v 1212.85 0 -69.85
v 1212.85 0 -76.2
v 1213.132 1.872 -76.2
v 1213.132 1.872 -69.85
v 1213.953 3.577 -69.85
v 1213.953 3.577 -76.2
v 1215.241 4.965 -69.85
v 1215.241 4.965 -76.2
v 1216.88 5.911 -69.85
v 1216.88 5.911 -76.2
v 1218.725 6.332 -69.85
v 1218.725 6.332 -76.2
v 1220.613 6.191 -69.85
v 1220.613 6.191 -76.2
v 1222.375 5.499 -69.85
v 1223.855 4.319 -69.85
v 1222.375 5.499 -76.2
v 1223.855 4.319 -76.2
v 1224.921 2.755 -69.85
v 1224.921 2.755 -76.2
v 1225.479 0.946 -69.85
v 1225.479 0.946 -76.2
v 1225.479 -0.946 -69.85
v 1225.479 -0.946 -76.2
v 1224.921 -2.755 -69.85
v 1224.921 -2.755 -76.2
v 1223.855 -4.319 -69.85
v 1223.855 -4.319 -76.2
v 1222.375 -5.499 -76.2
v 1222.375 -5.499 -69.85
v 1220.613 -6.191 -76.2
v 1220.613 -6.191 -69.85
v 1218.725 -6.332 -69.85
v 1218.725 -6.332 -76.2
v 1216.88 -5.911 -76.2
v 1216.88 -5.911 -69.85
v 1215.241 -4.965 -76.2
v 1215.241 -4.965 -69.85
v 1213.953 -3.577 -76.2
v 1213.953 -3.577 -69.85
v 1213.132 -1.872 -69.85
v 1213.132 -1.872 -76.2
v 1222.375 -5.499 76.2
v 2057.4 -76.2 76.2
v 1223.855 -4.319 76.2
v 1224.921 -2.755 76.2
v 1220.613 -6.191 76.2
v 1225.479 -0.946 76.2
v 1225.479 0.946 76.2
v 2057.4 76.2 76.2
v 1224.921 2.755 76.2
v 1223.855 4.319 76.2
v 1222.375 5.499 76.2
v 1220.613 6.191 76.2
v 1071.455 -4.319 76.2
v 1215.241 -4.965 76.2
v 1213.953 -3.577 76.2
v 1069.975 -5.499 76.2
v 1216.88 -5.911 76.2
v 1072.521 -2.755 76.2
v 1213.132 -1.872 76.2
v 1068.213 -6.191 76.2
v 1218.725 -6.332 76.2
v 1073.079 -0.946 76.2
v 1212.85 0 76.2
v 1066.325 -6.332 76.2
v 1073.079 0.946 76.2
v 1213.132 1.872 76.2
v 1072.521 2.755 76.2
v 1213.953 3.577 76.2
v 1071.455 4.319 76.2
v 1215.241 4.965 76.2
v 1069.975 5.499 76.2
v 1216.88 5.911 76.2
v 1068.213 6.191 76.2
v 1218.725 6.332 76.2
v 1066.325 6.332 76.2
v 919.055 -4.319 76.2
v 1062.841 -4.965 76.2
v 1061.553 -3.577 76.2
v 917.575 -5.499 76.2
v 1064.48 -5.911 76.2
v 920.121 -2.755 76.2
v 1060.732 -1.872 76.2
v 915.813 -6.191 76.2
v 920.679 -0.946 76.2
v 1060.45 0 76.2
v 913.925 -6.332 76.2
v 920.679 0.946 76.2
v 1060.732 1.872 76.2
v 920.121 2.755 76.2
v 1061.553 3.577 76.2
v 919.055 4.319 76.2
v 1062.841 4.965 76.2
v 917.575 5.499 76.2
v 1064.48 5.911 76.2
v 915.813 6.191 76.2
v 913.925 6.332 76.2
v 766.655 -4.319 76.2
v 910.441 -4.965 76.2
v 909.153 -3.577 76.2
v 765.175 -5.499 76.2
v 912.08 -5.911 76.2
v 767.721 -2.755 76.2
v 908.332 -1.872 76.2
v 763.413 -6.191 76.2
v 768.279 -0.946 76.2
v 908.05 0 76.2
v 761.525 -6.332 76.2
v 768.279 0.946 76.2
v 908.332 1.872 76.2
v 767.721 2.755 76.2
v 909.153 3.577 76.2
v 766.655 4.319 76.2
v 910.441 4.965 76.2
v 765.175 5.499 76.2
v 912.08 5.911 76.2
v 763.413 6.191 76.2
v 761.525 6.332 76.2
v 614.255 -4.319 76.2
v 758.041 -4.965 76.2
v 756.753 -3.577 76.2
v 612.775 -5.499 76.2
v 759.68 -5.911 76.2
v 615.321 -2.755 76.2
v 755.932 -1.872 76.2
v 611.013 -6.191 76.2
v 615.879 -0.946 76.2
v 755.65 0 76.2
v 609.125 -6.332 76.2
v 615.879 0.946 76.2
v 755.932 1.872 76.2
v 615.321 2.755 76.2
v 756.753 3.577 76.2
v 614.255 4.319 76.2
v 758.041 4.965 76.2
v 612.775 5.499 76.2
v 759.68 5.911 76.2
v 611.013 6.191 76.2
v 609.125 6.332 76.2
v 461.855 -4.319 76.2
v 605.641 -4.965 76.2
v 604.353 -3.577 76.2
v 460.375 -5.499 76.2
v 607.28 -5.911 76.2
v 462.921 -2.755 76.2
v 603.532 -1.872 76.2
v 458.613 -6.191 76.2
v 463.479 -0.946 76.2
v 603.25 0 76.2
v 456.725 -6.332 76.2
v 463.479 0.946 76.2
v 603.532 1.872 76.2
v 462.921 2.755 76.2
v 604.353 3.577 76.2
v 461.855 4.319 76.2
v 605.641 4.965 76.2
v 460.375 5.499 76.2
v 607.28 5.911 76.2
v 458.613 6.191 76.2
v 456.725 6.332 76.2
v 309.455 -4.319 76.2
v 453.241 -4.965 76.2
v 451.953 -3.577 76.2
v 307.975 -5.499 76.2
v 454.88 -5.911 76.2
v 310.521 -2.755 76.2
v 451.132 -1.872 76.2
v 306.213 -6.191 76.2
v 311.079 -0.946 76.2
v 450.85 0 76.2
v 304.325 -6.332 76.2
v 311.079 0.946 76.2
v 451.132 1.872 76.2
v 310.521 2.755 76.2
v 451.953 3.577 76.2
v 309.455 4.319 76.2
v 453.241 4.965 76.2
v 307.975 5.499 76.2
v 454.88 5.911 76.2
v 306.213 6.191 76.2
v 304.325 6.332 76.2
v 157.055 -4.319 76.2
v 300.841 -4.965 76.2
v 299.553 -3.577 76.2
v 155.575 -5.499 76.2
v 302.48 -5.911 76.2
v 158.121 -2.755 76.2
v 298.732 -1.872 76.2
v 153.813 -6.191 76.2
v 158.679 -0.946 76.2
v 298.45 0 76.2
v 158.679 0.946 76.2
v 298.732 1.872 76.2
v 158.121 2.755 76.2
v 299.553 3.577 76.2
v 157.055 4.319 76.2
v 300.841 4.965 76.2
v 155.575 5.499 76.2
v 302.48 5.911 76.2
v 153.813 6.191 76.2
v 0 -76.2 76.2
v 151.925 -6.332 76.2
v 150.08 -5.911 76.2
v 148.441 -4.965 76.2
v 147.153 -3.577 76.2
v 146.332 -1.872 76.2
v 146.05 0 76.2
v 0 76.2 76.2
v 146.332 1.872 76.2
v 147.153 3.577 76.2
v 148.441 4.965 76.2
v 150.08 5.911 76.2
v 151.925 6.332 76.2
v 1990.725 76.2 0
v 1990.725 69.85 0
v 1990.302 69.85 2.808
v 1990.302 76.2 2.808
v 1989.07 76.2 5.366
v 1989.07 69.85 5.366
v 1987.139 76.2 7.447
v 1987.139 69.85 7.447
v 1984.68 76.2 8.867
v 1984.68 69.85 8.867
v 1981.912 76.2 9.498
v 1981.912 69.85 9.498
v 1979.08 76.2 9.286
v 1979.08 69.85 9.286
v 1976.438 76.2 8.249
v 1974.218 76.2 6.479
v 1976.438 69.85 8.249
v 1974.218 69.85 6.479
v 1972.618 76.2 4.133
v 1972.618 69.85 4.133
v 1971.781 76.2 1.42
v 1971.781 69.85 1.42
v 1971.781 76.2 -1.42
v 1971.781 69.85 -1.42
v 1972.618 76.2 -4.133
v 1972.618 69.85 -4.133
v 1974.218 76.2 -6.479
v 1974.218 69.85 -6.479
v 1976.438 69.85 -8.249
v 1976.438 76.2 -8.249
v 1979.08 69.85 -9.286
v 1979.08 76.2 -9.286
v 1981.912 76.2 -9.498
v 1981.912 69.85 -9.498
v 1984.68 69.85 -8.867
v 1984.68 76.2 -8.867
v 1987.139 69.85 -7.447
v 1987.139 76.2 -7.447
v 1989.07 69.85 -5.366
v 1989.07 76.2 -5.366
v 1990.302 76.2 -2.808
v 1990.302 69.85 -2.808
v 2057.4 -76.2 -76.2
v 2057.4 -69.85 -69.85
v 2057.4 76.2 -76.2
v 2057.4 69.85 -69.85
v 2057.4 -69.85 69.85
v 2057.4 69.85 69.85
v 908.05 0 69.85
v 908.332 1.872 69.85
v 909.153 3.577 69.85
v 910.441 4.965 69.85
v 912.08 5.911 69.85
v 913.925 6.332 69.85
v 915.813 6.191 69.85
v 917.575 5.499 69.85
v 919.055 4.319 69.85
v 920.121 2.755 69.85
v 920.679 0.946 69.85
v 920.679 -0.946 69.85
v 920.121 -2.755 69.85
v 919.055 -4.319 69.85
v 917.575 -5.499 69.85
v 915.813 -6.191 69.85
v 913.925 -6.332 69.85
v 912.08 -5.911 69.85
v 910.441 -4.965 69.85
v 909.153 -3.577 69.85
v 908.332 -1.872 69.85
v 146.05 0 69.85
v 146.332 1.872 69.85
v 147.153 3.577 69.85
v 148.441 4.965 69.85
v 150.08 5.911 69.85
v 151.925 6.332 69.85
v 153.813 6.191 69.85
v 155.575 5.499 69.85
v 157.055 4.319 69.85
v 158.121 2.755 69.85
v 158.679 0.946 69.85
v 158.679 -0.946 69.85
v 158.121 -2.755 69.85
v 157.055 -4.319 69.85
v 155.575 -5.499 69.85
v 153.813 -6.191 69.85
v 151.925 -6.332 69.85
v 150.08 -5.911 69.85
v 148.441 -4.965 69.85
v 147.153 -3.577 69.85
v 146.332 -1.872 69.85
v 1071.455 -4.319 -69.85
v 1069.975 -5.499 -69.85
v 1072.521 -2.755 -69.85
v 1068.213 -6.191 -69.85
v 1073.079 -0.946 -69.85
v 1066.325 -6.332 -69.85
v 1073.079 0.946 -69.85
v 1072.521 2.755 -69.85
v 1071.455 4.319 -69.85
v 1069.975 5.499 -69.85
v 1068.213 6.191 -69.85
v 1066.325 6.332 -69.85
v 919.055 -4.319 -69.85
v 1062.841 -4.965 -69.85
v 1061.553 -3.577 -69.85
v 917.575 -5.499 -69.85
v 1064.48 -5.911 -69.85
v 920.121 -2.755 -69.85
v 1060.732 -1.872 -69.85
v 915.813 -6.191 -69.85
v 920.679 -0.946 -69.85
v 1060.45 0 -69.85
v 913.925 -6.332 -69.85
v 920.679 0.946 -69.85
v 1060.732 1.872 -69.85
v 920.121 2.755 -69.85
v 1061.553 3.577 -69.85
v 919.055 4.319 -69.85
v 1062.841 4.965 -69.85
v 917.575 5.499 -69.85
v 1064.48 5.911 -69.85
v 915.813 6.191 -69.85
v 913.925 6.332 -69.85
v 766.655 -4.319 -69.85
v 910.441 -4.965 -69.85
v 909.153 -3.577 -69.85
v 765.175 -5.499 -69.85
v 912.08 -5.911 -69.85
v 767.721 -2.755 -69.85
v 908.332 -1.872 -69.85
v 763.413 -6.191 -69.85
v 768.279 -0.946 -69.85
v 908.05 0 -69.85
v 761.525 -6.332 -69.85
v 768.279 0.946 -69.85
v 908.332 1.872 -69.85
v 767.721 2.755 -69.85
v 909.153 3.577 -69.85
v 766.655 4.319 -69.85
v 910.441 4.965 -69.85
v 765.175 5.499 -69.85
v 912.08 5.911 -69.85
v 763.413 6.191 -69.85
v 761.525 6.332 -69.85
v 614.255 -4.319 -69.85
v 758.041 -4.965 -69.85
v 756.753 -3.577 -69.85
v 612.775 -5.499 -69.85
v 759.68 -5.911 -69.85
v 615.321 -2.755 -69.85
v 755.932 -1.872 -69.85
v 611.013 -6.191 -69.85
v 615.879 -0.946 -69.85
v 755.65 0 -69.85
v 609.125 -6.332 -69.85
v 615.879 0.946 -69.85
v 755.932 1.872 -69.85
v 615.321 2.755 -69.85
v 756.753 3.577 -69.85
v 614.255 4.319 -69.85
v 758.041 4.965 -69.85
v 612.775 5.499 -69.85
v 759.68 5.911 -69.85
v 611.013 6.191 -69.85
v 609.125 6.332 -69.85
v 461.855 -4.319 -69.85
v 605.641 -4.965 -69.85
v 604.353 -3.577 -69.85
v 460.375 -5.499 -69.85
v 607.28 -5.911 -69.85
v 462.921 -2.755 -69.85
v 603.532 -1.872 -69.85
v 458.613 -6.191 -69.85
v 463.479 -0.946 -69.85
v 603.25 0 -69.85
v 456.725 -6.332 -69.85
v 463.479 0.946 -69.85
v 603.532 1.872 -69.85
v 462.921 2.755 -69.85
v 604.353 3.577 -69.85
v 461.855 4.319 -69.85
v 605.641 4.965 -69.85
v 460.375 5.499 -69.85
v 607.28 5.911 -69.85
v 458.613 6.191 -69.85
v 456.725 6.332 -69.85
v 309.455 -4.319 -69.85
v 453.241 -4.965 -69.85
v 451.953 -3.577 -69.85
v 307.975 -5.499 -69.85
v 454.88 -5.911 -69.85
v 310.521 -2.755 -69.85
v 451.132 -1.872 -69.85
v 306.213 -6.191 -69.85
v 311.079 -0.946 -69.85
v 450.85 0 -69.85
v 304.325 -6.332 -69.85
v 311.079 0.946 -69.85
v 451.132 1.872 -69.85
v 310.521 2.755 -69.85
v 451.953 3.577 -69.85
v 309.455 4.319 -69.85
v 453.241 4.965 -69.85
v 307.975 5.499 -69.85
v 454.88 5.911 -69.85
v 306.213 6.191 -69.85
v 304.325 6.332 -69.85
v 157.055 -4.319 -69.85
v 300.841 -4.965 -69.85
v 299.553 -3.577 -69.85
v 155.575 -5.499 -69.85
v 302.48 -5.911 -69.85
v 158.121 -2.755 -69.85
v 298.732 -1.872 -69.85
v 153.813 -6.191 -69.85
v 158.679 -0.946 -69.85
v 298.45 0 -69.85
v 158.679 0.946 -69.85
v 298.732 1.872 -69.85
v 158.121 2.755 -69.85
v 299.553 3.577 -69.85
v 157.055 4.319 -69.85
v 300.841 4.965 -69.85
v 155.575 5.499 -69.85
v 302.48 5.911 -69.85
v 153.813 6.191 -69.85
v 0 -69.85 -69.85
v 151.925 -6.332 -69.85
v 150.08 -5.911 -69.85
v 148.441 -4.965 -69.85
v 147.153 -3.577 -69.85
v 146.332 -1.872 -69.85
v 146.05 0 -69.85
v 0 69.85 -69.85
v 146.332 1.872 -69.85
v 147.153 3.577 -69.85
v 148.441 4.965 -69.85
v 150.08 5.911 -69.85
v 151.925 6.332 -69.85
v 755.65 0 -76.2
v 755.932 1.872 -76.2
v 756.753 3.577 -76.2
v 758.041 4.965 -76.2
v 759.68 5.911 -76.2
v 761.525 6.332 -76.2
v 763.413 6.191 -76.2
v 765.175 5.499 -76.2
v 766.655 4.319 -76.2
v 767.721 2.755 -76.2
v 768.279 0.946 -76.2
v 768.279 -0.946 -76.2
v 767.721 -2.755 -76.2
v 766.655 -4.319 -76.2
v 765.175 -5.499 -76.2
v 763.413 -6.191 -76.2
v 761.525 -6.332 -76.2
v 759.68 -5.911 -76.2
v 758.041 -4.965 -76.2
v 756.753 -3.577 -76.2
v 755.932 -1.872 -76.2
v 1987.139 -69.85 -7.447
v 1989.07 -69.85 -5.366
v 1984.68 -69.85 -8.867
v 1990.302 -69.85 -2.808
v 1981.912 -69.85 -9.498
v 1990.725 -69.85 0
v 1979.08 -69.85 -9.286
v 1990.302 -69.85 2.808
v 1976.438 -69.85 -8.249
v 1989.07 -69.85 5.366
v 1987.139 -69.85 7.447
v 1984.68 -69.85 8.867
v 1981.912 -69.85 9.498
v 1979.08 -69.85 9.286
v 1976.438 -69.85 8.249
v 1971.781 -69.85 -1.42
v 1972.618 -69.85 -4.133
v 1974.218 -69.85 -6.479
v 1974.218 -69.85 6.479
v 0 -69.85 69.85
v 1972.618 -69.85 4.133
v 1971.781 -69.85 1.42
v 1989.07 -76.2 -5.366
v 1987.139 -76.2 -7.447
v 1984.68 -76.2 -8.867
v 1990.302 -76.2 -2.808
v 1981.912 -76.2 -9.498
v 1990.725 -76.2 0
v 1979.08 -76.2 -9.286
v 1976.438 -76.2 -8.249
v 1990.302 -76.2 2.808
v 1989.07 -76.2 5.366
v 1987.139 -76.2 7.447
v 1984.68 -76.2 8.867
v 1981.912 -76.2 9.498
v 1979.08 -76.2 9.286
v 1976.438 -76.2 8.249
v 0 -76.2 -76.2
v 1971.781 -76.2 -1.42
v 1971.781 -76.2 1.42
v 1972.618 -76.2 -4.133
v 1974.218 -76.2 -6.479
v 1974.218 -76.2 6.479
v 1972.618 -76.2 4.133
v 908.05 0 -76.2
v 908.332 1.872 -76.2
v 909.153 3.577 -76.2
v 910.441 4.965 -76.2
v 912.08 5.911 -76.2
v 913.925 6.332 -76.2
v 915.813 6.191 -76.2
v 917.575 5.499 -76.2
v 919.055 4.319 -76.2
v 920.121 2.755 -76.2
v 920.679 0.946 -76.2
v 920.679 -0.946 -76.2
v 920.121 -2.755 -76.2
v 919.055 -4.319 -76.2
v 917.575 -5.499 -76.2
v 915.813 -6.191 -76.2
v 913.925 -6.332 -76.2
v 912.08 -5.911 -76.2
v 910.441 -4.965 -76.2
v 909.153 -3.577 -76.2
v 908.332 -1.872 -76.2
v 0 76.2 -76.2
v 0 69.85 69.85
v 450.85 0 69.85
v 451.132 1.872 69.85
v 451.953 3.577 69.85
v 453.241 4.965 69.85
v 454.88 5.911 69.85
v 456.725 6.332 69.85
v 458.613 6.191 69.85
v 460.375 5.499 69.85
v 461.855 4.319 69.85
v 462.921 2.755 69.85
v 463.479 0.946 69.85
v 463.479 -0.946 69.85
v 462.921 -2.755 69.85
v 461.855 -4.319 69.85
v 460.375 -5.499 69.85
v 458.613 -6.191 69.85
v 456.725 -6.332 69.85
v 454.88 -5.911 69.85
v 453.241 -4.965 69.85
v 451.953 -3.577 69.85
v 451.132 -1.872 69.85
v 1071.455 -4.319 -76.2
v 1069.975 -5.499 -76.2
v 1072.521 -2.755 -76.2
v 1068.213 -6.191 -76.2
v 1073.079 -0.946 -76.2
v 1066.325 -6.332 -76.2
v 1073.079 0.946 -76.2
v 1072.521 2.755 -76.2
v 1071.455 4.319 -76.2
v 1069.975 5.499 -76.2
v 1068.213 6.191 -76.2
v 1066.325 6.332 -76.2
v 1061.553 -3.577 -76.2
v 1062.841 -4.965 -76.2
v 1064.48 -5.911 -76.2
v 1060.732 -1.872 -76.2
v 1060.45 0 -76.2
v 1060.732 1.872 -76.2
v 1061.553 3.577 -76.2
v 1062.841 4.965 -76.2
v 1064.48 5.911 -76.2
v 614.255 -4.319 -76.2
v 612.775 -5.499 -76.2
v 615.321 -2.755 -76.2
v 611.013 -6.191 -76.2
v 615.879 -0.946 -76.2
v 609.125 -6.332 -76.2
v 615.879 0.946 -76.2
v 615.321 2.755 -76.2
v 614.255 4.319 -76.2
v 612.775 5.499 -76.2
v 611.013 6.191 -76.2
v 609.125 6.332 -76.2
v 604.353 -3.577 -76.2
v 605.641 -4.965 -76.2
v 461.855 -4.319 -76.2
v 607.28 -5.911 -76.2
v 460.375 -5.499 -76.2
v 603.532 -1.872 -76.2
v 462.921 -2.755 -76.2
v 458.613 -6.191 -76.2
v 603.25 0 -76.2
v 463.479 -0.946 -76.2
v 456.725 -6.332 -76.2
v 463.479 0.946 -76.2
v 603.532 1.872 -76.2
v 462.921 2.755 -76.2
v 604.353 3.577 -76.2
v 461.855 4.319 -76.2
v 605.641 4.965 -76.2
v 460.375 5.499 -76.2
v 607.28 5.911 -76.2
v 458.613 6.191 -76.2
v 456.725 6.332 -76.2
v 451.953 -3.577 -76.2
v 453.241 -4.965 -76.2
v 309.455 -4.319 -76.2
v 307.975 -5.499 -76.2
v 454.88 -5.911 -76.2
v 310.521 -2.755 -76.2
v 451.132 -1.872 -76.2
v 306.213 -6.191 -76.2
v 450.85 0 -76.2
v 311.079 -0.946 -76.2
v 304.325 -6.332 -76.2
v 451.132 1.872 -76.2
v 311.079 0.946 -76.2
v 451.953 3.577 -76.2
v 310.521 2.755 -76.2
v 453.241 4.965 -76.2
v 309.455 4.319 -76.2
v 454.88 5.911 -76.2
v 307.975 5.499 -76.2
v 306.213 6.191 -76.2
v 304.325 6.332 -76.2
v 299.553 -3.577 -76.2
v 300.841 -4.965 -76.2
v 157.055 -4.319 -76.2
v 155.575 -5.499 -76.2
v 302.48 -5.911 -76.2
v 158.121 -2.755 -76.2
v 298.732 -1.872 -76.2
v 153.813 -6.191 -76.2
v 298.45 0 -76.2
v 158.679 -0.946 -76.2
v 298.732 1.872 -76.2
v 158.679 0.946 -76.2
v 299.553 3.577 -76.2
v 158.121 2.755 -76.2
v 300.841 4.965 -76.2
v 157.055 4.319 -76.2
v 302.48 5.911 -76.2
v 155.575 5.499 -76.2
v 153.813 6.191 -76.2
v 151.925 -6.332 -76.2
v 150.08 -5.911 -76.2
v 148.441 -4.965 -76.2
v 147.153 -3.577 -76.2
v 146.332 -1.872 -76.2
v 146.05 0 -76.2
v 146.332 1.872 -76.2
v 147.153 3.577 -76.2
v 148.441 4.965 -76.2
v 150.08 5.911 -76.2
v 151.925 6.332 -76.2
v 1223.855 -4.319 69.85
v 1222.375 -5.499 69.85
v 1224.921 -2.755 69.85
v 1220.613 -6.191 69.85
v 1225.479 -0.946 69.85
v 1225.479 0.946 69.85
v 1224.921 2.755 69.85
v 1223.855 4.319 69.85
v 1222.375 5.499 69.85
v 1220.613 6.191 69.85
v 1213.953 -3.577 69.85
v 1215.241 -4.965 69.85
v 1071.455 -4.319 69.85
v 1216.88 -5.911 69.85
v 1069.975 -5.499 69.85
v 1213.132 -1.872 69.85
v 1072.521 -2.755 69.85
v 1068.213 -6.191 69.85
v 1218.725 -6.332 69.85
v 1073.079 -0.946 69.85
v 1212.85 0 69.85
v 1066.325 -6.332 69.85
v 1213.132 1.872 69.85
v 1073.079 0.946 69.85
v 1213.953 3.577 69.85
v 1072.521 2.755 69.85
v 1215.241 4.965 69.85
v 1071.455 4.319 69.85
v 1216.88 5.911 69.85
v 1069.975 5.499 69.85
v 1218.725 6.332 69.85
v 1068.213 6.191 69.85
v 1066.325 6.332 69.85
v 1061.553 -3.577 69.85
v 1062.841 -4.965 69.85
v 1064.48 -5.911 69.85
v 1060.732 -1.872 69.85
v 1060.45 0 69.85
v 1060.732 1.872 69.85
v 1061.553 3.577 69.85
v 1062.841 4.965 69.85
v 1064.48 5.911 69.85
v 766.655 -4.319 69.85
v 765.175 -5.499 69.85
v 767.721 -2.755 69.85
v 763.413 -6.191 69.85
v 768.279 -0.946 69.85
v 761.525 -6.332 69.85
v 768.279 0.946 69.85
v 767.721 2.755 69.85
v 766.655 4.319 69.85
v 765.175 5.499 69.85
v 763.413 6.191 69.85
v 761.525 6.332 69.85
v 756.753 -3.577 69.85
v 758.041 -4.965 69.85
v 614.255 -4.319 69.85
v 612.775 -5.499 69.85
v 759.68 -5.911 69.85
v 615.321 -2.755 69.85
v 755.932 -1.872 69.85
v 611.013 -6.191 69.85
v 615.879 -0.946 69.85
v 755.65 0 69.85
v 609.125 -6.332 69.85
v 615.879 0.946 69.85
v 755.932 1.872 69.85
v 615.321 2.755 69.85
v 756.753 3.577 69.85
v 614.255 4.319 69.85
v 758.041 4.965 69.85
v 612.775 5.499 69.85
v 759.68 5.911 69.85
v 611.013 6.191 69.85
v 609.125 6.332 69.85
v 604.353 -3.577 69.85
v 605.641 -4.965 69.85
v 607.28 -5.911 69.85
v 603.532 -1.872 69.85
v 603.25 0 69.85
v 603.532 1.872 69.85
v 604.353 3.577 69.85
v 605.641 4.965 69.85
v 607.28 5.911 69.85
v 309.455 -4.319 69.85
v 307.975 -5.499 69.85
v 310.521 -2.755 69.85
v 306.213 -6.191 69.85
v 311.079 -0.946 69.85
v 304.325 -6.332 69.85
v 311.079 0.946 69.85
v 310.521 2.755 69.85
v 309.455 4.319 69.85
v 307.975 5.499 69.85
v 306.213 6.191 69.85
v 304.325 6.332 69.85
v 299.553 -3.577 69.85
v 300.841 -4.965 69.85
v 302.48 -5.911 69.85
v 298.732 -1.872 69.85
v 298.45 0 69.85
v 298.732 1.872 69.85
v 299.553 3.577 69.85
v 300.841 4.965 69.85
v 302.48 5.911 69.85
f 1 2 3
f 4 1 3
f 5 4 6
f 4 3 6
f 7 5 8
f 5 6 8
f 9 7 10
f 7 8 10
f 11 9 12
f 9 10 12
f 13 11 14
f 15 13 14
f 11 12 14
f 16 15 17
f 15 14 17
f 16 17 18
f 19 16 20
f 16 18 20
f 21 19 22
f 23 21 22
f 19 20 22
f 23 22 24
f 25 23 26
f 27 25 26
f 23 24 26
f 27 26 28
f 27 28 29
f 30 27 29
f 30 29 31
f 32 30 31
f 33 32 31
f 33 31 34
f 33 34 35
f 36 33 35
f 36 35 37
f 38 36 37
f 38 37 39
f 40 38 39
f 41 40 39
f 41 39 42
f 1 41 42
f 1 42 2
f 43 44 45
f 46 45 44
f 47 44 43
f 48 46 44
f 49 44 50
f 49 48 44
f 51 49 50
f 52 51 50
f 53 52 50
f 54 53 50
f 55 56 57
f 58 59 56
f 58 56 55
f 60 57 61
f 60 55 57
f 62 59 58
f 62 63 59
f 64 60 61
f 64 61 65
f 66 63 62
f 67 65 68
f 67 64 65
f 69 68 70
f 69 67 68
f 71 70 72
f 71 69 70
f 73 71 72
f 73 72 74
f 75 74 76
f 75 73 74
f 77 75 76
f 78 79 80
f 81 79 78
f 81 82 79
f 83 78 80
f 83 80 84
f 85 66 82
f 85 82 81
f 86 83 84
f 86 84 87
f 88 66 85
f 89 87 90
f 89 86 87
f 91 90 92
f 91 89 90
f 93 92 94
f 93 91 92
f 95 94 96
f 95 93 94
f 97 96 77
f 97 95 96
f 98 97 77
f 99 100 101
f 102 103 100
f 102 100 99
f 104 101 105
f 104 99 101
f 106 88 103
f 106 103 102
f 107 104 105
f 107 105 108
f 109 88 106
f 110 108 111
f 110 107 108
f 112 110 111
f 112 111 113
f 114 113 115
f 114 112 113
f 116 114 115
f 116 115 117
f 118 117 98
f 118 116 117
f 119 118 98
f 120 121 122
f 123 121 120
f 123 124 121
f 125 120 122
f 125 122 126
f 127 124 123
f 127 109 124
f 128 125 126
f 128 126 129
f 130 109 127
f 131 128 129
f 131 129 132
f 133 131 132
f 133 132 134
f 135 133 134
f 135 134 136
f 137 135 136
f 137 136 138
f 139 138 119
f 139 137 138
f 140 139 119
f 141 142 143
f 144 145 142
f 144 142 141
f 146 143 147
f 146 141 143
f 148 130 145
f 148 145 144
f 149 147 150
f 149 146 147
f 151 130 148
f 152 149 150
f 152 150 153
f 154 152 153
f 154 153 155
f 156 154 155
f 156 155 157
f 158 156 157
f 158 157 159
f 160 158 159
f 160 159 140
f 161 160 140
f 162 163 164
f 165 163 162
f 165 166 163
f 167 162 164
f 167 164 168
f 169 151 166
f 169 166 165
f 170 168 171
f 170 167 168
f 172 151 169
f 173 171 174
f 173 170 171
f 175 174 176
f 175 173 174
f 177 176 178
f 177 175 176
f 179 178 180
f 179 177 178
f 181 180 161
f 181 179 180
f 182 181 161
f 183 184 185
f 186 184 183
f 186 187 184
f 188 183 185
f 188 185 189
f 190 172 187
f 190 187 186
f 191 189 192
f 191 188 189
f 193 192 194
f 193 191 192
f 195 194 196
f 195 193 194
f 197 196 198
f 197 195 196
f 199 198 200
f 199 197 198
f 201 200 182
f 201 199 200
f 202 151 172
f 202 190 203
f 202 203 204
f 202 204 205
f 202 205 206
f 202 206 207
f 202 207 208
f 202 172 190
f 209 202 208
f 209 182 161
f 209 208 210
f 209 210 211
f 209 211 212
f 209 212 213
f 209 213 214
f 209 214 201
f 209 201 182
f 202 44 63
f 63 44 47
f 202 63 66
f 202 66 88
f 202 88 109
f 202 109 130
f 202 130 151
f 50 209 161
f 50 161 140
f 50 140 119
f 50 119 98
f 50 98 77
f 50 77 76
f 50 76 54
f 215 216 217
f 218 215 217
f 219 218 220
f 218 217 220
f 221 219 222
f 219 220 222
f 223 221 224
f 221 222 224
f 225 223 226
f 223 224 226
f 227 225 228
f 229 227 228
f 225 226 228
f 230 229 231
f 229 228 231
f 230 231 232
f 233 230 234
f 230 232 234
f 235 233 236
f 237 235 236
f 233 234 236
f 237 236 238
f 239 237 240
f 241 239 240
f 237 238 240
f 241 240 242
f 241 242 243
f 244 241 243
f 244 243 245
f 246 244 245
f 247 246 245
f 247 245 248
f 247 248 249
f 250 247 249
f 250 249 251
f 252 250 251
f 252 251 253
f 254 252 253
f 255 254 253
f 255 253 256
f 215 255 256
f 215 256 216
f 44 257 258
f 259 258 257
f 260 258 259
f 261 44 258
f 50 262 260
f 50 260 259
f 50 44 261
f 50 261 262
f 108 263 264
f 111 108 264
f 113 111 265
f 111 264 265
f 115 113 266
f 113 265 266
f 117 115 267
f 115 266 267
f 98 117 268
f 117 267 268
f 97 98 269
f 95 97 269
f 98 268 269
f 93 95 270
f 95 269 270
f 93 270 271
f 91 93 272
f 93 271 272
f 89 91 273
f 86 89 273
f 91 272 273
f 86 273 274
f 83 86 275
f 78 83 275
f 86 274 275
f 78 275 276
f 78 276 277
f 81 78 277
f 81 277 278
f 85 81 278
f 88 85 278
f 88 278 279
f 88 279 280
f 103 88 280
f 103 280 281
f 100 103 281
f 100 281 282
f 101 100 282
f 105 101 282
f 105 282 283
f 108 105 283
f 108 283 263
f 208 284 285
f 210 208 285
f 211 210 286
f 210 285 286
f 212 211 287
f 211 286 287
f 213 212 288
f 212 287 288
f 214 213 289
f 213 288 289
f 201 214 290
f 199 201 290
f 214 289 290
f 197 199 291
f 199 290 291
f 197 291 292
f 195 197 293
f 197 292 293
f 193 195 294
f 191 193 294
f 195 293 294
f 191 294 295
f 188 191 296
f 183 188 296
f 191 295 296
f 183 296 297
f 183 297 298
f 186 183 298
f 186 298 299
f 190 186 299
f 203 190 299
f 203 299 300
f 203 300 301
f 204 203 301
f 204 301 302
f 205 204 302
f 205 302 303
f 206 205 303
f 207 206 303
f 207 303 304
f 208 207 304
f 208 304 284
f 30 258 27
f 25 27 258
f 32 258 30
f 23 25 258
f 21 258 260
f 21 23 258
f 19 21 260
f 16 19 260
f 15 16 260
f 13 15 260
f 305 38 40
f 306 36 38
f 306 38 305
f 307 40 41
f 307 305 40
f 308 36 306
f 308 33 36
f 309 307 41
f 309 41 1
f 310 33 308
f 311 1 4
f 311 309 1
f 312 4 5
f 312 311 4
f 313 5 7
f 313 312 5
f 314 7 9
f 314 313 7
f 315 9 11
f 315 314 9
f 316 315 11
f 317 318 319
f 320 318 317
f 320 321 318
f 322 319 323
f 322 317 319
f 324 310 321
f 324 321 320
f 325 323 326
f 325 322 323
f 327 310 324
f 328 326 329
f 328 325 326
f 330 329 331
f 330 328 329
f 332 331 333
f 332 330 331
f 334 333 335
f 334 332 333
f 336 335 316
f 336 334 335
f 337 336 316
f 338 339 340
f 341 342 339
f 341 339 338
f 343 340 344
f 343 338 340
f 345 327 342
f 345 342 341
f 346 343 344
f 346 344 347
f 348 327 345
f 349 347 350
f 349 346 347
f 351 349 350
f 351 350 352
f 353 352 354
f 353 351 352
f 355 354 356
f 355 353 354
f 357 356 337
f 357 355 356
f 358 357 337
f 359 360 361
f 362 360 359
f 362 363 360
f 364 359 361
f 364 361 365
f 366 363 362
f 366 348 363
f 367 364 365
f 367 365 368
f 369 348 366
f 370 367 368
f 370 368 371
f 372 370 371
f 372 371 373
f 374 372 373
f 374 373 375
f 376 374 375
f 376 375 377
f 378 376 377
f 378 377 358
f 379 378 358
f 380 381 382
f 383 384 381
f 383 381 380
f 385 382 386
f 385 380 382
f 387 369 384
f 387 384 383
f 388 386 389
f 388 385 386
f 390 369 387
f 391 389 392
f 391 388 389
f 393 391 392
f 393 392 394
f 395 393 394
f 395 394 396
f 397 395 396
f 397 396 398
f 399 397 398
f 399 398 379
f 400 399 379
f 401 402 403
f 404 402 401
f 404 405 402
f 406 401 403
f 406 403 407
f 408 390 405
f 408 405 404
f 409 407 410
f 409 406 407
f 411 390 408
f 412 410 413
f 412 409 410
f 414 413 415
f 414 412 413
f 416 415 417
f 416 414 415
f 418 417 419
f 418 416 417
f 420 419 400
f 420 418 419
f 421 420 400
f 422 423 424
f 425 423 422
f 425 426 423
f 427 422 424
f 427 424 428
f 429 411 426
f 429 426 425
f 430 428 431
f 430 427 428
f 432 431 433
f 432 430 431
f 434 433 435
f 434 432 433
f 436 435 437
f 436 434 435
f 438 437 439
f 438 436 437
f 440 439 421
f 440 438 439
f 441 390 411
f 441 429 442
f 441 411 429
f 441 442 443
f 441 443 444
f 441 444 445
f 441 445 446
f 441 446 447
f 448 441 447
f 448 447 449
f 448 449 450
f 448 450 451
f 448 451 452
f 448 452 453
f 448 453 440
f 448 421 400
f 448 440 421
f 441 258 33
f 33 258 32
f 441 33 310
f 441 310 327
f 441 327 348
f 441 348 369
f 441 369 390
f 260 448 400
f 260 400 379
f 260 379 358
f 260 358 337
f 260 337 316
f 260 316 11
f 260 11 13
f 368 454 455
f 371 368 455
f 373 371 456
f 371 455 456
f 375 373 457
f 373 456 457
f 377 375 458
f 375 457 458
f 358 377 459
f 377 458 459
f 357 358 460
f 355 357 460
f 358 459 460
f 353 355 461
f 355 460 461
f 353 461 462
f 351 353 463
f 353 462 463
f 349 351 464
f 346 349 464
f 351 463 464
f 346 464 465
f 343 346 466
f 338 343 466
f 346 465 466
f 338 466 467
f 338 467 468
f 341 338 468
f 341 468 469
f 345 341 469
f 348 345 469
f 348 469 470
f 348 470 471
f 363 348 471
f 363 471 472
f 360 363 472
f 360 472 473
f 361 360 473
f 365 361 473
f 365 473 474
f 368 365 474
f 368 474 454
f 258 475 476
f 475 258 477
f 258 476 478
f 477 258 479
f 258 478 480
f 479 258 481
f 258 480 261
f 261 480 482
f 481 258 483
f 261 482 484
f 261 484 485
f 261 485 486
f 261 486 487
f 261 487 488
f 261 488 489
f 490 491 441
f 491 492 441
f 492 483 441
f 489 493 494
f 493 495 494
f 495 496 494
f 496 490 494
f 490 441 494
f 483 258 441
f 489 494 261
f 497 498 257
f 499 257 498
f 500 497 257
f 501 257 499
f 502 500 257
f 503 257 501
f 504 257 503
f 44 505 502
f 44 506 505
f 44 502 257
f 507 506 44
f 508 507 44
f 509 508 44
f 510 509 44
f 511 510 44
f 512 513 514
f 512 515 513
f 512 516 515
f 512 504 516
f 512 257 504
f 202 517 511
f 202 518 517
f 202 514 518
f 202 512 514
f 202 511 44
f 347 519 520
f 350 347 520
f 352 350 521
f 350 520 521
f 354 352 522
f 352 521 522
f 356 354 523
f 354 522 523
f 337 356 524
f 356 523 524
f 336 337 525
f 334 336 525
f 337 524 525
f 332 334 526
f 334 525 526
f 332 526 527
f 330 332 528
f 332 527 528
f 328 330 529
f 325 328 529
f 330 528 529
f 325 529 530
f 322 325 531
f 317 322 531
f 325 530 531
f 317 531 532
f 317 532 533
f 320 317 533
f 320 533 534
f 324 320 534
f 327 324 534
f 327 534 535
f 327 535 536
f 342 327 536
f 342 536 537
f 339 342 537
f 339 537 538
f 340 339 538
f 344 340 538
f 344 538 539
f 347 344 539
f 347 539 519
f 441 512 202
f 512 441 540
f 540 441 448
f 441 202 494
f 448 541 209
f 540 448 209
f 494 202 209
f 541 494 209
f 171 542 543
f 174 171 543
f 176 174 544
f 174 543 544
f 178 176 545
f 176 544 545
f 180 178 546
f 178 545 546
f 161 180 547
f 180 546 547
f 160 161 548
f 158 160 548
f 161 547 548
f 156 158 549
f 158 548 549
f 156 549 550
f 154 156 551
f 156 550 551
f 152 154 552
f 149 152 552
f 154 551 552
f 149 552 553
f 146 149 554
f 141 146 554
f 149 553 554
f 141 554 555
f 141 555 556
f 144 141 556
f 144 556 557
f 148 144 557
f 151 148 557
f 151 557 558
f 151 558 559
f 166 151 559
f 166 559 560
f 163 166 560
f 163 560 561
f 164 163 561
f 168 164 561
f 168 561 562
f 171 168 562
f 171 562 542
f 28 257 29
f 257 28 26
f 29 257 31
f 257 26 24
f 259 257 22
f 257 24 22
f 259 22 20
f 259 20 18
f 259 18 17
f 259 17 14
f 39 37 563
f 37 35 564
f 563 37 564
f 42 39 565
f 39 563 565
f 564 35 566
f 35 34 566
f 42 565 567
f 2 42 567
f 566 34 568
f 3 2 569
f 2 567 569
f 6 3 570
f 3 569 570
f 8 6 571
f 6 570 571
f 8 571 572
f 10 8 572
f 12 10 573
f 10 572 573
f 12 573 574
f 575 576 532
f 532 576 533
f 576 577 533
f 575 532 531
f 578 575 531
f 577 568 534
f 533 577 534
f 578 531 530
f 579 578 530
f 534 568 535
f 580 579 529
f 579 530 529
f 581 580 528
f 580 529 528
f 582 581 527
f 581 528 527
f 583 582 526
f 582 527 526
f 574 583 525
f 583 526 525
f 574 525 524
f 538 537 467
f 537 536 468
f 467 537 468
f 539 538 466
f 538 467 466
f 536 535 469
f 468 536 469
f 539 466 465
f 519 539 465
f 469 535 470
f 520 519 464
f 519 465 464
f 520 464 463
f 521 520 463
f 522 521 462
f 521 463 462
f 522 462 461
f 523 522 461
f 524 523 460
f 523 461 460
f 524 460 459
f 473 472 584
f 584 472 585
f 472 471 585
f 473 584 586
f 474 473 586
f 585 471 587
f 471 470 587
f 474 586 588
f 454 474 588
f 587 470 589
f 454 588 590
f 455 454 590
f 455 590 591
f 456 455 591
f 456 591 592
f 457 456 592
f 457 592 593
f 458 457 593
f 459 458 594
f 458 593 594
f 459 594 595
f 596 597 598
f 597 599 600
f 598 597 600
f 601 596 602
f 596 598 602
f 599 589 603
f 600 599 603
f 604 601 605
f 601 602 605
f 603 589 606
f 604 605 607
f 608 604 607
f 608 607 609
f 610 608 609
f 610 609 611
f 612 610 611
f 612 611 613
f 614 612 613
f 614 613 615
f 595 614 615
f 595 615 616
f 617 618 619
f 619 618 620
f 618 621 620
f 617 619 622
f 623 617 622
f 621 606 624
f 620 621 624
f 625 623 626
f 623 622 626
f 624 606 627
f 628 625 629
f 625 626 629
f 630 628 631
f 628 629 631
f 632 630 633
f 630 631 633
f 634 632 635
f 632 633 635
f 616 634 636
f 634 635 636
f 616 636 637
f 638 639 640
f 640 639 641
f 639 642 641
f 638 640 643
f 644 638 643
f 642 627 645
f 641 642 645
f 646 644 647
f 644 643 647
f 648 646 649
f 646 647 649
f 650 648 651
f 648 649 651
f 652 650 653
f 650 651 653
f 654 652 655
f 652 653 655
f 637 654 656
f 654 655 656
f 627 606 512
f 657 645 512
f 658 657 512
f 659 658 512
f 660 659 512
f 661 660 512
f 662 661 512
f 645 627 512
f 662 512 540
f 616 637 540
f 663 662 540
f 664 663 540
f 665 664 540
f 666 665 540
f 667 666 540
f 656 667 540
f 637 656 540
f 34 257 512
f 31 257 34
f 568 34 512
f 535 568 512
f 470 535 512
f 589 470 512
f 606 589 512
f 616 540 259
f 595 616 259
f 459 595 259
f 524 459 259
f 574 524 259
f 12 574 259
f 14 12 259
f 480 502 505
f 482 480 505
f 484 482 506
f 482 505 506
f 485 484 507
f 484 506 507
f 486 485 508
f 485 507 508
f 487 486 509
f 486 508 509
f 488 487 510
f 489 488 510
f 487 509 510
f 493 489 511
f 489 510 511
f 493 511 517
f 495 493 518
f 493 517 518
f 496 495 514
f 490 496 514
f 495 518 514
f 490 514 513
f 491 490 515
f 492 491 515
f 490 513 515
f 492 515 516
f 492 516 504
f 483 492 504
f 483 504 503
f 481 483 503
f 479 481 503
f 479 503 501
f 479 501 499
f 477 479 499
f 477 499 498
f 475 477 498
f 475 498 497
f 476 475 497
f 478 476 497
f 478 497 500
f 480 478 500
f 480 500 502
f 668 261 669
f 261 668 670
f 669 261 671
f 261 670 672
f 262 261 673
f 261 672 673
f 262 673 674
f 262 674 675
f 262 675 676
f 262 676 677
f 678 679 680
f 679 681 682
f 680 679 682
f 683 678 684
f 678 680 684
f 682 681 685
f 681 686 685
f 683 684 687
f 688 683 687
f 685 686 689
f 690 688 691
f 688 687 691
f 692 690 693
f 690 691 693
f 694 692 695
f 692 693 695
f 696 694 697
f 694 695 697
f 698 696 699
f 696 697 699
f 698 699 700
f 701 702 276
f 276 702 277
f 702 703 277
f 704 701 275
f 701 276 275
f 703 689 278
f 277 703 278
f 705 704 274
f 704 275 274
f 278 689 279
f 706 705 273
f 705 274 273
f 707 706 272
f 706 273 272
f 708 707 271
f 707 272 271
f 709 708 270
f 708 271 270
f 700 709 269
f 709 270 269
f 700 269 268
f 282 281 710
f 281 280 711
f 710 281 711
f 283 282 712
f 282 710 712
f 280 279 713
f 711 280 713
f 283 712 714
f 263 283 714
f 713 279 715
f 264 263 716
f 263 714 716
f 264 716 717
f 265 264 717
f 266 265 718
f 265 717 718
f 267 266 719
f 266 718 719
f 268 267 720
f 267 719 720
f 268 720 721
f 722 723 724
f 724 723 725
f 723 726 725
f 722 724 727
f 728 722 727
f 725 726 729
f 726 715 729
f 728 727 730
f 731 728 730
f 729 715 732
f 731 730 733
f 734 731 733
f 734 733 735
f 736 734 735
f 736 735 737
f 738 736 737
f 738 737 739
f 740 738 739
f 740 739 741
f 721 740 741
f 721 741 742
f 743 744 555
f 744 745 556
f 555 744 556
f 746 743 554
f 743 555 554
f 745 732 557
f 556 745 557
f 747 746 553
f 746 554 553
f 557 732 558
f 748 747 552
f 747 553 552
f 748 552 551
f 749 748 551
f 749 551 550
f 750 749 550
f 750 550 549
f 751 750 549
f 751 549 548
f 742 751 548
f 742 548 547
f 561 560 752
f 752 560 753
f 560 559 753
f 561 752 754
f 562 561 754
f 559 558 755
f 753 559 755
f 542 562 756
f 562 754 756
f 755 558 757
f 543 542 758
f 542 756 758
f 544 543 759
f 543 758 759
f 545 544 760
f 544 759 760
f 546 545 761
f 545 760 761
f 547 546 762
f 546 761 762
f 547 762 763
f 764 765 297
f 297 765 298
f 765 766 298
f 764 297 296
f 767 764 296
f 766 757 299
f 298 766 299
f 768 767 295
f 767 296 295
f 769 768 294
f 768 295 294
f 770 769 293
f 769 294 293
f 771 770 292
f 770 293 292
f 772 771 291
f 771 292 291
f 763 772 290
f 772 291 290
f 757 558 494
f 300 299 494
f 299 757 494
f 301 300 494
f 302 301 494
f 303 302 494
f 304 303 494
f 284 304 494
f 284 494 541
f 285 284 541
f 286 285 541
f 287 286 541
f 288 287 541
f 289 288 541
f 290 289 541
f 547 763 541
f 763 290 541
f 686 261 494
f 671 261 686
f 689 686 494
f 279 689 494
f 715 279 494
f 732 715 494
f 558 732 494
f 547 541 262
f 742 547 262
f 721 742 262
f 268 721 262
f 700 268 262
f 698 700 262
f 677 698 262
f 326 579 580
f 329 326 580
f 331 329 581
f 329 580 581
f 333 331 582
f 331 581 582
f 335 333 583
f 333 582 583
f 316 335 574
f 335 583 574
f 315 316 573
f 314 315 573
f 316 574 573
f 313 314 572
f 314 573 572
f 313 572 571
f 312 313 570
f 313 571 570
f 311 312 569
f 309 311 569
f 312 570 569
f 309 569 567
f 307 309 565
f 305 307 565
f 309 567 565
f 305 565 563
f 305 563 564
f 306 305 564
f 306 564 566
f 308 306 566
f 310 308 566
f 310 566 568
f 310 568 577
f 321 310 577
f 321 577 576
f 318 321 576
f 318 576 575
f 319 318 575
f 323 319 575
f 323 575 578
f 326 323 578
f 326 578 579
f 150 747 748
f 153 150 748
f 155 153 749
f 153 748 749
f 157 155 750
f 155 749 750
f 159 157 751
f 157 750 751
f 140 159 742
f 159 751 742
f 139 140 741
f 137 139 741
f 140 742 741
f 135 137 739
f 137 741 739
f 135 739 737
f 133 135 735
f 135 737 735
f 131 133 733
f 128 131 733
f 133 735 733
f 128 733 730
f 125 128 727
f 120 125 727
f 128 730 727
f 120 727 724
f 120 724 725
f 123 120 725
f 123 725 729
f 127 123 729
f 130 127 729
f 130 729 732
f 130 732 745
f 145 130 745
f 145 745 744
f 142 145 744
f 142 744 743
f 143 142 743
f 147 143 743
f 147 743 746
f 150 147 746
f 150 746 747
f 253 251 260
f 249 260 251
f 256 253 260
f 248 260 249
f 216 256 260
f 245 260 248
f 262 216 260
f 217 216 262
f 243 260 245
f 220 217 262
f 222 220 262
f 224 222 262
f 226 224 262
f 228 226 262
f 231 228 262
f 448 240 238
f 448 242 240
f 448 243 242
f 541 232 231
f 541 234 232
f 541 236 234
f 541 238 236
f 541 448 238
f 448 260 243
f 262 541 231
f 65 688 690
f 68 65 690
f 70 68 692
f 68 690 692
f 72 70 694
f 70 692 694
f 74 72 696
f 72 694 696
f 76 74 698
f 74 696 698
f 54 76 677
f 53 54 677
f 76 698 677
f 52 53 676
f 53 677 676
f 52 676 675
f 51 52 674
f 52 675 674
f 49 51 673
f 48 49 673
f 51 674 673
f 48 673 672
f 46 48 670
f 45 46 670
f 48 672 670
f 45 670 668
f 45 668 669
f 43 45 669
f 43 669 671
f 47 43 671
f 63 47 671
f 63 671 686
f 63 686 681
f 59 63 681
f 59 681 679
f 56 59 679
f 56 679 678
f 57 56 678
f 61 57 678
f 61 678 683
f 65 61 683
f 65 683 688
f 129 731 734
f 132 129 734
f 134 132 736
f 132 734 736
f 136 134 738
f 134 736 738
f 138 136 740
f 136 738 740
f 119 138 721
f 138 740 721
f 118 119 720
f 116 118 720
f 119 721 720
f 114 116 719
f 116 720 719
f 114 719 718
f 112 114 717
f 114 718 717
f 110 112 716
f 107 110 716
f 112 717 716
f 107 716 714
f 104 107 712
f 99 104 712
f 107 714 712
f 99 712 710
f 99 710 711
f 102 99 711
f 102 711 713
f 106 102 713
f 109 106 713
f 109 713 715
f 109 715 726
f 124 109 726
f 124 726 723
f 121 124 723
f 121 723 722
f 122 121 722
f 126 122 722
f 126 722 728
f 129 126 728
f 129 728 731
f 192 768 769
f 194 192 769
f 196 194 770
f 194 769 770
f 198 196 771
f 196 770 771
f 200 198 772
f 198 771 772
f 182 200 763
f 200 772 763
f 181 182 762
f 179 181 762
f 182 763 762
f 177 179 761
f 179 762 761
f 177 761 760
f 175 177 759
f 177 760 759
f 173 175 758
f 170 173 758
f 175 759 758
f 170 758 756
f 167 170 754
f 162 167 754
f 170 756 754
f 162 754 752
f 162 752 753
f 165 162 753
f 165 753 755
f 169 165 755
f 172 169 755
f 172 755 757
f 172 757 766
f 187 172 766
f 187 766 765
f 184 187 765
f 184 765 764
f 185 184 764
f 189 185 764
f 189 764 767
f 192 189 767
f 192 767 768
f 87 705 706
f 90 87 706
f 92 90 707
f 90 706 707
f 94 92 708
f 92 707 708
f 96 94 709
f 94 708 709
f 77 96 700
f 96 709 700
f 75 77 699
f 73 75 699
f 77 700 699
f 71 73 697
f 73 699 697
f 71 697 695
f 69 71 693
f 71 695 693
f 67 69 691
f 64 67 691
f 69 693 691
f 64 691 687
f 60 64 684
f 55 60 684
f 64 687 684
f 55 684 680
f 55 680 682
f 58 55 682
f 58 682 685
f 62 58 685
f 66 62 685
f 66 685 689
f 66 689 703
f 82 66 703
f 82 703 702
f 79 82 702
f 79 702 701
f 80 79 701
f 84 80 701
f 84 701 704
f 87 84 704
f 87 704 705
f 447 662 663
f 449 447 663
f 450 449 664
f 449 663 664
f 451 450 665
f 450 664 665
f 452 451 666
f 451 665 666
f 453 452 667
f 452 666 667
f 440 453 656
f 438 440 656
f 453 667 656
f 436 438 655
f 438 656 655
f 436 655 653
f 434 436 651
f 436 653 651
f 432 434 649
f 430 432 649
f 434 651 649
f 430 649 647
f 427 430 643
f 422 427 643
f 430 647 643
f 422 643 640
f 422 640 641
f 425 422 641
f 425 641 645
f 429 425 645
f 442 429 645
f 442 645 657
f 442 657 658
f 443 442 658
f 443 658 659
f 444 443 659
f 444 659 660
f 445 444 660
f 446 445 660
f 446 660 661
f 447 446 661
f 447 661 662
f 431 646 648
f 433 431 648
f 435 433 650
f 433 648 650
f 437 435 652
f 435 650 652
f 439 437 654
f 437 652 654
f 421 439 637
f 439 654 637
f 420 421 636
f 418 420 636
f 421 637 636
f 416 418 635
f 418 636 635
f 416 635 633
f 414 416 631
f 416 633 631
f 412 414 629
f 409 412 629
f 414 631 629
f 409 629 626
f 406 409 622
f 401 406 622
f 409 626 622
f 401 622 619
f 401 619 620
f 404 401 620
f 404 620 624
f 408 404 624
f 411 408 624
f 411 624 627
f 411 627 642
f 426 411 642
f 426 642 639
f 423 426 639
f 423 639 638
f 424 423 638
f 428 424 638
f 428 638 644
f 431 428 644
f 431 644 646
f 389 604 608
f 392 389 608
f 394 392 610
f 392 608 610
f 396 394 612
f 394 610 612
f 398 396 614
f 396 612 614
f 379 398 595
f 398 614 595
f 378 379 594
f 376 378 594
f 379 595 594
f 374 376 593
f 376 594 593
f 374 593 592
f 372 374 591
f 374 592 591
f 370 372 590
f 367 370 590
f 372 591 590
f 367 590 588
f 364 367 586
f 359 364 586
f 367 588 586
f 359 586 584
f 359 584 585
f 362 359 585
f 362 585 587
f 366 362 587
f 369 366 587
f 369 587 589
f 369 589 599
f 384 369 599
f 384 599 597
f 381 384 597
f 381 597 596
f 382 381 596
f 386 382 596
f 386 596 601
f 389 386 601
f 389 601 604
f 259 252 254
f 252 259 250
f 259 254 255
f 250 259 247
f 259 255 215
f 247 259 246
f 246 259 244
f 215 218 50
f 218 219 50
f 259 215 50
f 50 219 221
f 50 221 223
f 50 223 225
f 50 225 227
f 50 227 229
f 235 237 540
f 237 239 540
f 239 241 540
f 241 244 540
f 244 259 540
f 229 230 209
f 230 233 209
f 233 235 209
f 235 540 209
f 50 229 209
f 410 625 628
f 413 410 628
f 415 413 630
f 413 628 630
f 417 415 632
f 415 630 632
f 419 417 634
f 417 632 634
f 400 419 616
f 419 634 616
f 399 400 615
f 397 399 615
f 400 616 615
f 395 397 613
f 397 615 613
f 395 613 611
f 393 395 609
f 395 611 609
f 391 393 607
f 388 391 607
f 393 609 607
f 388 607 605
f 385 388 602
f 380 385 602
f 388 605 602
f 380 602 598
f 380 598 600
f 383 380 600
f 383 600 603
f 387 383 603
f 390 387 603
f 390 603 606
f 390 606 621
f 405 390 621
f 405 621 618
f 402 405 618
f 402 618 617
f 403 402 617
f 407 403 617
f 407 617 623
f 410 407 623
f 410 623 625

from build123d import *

# Parameters (mm, degrees)
F0_W     = 152.4
F0_H     = 152.4
F0_W_2   = 139.7
F0_H_2   = 139.7
F1_DEPTH = 2057.4
F3_D     = 12.7
F5_D     = 19.05


with BuildPart() as f1:
    # F0 (on Right) → F1 (new body)
    with BuildSketch(Plane.YZ):
        Rectangle(F0_W, F0_H)
        Rectangle(F0_W_2, F0_H_2, mode=Mode.SUBTRACT)
    extrude(amount=F1_DEPTH)

    # F3 (through all)
    with Locations(Plane.XY.offset(76.2)):
        with Locations((152.4, 0), (304.8, 0), (457.2, 0), (609.6, 0), (762, 0), (914.4, 0), (1066.8, 0), (1219.2, 0)):
            Hole(F3_D / 2)

    # F5 (through all)
    with Locations(Plane(origin=(0, 76.2, 0), x_dir=(-1, 0, 0), z_dir=(0, 1, 0))):
        with Locations((-1981.2, 0)):
            Hole(F5_D / 2)


solid = f1.part
